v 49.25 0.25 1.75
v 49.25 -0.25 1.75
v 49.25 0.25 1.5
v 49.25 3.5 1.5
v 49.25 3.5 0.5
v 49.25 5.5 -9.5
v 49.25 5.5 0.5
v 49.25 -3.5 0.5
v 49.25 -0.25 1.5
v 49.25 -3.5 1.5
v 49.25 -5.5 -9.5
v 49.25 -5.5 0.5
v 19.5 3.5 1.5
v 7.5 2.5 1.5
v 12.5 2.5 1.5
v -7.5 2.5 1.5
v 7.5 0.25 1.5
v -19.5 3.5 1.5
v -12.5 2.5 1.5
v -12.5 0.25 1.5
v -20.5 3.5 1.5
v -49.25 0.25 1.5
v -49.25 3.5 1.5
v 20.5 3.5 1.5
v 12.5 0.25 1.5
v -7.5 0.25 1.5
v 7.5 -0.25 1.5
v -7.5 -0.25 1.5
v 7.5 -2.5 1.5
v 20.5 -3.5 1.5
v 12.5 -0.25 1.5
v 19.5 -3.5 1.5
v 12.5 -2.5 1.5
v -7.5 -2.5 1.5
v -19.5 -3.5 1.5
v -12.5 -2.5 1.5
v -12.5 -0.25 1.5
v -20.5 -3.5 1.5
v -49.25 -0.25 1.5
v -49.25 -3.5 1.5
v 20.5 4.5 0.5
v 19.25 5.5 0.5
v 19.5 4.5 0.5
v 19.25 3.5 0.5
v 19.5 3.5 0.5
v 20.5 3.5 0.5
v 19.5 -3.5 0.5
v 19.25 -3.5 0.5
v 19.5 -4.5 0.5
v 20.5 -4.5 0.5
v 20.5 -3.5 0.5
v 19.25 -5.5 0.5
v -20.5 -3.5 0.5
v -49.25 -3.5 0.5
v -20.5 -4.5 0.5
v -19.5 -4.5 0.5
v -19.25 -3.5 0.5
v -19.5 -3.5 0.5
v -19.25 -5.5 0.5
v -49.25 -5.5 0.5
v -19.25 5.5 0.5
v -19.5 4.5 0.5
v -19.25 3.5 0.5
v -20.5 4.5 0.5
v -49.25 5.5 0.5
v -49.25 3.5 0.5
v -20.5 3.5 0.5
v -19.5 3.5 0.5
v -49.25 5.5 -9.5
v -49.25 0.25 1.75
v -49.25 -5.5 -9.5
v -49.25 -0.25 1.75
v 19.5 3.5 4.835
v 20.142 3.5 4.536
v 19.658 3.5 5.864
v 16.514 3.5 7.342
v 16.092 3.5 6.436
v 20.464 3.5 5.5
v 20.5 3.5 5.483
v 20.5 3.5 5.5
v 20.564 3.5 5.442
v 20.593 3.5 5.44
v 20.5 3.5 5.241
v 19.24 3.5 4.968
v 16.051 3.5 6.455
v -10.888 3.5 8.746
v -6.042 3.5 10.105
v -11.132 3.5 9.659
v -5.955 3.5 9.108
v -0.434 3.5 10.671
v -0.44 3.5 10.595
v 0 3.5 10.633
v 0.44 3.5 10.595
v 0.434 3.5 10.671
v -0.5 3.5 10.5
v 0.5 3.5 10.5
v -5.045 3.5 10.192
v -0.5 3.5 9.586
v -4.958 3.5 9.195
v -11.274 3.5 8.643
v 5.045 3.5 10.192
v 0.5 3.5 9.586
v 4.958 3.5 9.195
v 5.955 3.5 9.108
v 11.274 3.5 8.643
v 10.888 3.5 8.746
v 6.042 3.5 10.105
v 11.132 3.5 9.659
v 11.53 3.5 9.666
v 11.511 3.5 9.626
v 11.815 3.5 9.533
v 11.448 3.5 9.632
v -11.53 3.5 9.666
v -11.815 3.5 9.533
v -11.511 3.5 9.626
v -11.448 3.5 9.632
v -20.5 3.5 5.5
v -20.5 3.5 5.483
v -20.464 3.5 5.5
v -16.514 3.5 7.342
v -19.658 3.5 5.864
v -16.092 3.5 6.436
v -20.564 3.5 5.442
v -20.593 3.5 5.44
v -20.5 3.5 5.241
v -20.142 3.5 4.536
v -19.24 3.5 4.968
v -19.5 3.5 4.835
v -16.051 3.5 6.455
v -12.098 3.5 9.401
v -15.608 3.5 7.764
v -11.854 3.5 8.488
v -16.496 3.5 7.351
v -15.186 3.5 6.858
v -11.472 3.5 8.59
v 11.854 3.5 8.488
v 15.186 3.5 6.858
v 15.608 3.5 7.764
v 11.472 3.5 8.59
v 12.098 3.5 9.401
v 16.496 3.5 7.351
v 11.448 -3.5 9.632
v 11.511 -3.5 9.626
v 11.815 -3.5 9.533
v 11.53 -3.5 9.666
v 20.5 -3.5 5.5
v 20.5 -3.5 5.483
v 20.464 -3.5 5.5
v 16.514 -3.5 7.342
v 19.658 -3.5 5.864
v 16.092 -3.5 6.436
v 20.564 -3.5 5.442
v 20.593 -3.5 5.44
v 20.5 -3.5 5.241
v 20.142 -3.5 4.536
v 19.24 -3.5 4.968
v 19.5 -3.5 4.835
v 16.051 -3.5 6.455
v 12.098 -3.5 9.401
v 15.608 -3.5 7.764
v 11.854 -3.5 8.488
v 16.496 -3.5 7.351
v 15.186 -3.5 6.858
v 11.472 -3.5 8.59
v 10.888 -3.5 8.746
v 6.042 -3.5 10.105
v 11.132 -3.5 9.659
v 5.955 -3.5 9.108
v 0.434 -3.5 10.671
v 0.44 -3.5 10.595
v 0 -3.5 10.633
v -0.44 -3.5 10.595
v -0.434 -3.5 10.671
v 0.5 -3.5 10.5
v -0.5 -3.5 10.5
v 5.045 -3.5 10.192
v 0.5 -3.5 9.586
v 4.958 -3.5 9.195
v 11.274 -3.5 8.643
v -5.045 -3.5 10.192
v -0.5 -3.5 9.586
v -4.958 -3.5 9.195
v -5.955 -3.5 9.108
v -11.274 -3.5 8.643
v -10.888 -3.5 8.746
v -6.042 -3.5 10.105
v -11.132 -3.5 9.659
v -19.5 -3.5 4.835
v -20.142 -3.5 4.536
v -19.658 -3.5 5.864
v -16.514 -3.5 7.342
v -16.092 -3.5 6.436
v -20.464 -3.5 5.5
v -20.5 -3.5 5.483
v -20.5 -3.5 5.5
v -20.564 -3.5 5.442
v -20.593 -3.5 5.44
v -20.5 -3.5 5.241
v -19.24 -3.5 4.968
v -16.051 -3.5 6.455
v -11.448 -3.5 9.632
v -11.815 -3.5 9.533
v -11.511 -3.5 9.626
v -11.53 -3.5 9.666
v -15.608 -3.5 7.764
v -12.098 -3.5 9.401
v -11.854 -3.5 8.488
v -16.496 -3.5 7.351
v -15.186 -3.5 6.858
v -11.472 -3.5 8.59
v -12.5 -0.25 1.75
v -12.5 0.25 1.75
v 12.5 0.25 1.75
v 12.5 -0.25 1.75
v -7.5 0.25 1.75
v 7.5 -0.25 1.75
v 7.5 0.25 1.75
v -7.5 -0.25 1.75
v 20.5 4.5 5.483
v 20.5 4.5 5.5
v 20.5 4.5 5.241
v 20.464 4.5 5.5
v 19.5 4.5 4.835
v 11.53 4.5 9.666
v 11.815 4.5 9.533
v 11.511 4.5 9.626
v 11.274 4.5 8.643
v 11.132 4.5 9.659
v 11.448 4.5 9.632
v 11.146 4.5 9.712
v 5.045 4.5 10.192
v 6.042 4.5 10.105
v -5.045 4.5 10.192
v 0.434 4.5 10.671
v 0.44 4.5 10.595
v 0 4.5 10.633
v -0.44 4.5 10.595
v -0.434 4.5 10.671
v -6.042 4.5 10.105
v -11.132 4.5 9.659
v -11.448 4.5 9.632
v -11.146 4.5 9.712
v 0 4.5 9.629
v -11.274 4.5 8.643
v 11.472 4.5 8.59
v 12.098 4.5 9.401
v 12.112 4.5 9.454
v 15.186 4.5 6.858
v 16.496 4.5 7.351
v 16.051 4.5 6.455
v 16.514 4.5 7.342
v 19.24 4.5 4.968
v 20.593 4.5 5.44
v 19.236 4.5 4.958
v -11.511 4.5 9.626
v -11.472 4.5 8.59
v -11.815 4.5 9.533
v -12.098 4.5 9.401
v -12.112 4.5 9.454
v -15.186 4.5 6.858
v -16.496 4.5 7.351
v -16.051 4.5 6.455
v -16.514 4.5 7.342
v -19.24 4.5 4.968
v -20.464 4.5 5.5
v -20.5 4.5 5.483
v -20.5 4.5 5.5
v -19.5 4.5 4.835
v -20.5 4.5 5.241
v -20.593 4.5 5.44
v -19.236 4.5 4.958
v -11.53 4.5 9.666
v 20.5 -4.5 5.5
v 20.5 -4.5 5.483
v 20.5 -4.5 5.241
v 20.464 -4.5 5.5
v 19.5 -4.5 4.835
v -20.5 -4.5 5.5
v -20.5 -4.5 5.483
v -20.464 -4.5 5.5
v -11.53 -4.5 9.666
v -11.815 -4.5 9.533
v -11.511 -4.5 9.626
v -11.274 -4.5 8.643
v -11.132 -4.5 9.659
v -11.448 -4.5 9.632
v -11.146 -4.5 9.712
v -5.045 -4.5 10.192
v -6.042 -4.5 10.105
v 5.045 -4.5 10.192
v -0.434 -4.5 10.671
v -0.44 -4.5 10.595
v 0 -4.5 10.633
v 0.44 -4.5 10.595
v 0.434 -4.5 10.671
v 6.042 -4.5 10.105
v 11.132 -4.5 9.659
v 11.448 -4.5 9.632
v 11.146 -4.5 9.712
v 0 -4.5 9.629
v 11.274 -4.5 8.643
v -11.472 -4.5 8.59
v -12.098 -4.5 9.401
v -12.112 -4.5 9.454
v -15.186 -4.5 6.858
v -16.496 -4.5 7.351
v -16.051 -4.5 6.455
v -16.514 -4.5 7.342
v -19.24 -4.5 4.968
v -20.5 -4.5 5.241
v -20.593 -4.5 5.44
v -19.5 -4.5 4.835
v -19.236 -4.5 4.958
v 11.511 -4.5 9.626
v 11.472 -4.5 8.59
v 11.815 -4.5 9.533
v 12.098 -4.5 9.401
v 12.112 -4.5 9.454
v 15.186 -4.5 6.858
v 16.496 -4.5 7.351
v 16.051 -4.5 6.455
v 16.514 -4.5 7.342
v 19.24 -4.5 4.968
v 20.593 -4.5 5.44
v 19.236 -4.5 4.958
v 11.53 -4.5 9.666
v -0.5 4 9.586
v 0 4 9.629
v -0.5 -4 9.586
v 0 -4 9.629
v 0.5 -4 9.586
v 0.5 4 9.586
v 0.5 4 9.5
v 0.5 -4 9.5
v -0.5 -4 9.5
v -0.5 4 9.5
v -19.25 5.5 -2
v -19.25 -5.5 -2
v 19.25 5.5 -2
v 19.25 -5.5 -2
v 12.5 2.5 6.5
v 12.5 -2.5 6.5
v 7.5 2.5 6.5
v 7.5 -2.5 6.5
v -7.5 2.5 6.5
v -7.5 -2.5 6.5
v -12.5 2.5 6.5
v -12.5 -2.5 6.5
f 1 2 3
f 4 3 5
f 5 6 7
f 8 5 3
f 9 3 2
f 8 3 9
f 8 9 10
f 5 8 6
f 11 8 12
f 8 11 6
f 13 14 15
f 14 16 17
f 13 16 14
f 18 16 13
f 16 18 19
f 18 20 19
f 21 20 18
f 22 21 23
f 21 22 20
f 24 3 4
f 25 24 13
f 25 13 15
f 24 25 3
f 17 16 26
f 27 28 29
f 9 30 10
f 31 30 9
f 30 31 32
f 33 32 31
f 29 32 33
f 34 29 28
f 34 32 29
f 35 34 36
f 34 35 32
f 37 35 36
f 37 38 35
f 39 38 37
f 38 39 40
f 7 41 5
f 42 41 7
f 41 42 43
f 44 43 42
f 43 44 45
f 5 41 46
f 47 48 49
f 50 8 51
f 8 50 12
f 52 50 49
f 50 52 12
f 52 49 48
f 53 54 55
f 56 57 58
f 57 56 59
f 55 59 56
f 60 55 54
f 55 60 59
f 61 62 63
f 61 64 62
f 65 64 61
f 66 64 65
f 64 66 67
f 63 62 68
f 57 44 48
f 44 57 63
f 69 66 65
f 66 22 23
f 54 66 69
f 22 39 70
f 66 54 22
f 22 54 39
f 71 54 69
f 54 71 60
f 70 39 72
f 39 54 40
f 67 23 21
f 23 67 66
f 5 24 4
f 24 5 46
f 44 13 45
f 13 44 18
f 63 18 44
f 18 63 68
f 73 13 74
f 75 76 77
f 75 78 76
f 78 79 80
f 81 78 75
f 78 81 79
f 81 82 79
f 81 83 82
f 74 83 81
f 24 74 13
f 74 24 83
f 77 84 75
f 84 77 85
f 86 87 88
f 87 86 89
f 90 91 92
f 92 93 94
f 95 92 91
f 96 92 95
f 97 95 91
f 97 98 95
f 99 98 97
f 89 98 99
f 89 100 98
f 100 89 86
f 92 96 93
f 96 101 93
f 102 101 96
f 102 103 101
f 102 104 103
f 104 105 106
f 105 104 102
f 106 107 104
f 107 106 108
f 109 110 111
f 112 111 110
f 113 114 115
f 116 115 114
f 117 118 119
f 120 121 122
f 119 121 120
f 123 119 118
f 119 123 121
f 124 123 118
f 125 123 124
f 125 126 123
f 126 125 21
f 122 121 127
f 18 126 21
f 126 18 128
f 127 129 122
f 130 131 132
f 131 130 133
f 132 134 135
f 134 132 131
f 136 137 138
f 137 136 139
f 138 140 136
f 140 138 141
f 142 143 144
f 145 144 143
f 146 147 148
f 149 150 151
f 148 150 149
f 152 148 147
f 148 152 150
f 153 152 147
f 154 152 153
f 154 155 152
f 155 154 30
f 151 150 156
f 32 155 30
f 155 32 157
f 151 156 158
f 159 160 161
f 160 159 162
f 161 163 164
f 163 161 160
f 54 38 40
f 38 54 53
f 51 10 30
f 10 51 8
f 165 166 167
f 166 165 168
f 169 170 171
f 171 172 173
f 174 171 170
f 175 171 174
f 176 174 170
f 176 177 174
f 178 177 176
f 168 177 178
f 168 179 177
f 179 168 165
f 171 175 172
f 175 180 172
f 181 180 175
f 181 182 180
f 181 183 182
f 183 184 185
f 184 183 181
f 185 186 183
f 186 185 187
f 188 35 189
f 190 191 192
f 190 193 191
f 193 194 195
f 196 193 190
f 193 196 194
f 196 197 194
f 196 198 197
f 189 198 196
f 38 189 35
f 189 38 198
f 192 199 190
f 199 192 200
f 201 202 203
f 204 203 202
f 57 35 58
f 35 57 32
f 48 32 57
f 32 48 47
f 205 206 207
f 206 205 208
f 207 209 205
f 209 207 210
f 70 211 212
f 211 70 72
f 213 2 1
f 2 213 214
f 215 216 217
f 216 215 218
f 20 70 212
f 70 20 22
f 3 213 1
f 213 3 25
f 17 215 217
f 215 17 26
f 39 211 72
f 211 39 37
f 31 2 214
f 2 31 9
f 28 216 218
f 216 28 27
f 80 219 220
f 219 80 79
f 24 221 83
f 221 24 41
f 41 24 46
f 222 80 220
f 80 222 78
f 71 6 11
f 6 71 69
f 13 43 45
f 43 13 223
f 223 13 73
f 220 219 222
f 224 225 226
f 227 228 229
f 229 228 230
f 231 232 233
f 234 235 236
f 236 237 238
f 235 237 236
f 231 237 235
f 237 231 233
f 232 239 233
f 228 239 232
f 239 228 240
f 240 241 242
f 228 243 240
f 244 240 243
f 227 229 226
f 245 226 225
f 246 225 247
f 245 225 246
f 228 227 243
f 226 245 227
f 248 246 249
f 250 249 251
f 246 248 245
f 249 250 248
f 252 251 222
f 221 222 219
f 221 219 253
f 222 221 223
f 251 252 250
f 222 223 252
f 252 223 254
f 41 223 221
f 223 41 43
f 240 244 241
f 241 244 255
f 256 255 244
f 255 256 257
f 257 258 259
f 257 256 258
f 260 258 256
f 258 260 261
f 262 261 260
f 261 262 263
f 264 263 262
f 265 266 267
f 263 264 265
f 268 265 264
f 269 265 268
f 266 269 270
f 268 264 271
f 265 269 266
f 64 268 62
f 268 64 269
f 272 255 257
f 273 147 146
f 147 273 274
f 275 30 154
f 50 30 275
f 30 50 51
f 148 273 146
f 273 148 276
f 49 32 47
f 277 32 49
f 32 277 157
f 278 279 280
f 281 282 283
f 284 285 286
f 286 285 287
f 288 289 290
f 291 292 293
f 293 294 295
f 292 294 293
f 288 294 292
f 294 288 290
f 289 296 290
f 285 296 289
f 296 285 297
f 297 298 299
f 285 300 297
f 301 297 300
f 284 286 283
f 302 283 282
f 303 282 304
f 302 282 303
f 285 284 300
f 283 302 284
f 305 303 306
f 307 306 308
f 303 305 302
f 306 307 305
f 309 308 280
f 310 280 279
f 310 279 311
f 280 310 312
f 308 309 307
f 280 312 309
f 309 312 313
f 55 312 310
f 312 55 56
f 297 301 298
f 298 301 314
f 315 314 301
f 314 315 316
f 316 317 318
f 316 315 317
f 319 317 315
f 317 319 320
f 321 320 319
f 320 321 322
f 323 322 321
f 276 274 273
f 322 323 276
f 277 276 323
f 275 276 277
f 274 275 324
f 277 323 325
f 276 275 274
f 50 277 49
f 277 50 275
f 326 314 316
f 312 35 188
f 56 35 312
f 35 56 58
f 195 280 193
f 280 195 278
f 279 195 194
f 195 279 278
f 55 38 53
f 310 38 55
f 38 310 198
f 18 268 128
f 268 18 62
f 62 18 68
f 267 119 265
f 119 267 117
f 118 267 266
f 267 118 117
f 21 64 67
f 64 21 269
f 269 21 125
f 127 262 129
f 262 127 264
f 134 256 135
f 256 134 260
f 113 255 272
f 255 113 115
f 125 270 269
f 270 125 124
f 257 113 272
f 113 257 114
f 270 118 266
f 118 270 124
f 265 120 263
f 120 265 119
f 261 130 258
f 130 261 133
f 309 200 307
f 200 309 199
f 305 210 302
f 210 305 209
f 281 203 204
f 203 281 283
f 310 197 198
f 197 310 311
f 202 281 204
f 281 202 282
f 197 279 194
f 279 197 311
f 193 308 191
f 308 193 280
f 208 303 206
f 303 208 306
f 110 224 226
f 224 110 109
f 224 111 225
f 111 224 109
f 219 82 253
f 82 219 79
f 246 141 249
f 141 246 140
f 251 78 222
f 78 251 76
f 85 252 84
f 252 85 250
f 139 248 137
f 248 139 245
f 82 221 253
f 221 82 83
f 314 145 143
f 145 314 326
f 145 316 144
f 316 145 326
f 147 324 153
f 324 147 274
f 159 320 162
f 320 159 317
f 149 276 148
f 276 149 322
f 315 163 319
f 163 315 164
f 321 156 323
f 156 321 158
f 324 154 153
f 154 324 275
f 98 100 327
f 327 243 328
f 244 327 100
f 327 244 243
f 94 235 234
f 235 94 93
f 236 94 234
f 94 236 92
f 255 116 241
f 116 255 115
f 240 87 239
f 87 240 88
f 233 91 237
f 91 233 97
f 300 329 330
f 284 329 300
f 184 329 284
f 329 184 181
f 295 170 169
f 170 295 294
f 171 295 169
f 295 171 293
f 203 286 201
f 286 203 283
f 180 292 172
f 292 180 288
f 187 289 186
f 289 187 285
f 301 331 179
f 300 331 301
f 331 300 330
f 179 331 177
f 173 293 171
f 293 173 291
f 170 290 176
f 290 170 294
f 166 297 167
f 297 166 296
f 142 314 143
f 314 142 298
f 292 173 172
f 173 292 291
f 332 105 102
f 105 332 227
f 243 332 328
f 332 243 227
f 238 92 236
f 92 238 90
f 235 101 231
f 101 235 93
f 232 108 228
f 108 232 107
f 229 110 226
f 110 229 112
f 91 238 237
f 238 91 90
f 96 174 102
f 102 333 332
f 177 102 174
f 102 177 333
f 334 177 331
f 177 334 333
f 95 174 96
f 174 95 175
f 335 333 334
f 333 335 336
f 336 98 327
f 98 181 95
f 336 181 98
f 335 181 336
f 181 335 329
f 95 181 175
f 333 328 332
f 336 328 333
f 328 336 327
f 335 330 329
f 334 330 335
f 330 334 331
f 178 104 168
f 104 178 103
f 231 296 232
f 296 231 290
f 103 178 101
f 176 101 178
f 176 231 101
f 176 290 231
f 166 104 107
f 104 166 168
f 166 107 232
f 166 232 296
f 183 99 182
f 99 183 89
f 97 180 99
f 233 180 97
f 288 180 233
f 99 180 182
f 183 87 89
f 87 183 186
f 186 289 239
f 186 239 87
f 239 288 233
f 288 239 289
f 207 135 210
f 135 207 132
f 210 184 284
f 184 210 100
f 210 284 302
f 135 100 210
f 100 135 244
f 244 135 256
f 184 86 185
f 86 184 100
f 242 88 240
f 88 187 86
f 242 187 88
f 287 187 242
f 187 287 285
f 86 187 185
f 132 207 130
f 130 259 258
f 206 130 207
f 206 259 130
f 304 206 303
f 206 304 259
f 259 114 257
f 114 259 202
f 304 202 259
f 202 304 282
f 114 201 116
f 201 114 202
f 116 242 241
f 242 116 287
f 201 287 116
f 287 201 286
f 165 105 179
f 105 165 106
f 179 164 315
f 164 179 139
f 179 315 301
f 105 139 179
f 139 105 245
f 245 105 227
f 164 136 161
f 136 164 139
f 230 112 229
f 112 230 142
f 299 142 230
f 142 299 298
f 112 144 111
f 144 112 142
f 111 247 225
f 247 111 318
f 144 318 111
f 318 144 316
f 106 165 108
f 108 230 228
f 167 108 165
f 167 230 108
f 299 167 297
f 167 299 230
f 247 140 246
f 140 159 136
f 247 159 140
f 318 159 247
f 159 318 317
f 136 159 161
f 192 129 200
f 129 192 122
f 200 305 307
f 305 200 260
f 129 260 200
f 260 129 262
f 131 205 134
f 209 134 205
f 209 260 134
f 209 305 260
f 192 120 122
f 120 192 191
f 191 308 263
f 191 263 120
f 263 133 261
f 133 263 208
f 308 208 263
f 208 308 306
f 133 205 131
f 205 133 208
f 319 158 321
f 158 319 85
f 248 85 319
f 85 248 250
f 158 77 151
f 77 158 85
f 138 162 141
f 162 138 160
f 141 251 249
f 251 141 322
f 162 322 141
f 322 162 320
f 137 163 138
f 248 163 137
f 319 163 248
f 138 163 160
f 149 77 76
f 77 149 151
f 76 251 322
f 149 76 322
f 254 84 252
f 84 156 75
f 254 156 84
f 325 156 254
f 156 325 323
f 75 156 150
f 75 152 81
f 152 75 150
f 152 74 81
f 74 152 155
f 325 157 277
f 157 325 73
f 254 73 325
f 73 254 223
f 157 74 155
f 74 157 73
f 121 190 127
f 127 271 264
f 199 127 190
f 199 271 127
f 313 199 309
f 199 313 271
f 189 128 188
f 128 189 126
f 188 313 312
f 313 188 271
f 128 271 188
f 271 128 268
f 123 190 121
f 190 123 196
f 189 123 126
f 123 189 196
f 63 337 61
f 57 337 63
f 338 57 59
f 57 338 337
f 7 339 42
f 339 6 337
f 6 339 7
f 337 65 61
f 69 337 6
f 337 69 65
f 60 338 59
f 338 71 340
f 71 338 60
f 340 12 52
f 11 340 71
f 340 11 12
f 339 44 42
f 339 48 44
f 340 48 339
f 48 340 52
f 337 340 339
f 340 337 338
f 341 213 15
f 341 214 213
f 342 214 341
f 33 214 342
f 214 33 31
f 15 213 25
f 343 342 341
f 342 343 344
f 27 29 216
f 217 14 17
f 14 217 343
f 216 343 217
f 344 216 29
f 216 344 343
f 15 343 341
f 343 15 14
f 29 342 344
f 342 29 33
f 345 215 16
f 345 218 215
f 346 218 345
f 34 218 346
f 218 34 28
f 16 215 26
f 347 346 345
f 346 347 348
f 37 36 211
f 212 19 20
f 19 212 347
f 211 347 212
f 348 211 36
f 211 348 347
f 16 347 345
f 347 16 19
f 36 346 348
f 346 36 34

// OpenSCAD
//It's a Bridge!
//Elias Jones 1/20/21

//Road
translate([0,0,1]) 
color("grey")
   cube([98.5,7,1],center=true);
translate([0,0,1.5]) 
color("white")
    cube([98.5,.5,.5],center=true); 
//Supports 
translate([20,4,-2]) 
color("red")
   cube([1,1,15],center=true);
translate([20,-4,-2]) 
color("red")
   cube([1,1,15],center=true);
translate([-20,-4,-2]) 
color("red")
   cube([1,1,15],center=true);
translate([-20,4,-2]) 
color("red")
   cube([1,1,15],center=true);
translate([-15.85,4,7.1]) 
rotate([0,65,0])
color("red")
    cube([1,1,10],center=true);  
translate([-15.85,-4,7.1]) 
rotate([0,65,0])
color("red")
    cube([1,1,10],center=true);     
translate([15.85,4,7.1]) 
rotate([0,-65,0])
color("red")
    cube([1,1,10],center=true);     
translate([15.85,-4,7.1]) 
rotate([0,-65,0])
color("red")
    cube([1,1,10],center=true);     
translate([-5.5,4,9.65]) 
rotate([0,85,0])
color("red")
    cube([1,1,12.],center=true);        
translate([-5.5,-4,9.65]) 
rotate([0,85,0])
color("red")
    cube([1,1,12.],center=true);      
translate([5.5,-4,9.65]) 
rotate([0,-85,0])
color("red")
    cube([1,1,12.],center=true);      
translate([5.5,4,9.65]) 
rotate([0,-85,0])
color("red")
    cube([1,1,12.],center=true); 
            translate([0,0,10]) 
rotate([0,0,0])
color("red")
    cube([1,8,1],center=true);       
translate([5.5,0,9.65]) 
rotate([0,-85,0])
color("red")
    cube([1,9,1],center=true);     
translate([-5.5,0,9.65]) 
rotate([0,85,0])
color("red")
    cube([1,9,1],center=true);
translate([-11.5,0,9.1]) 
rotate([0,75,0])
color("red")
    cube([1,9,1],center=true);
translate([11.5,0,9.1]) 
rotate([0,-75,0])
color("red")
    cube([1,9,1],center=true);      
translate([-15.85,0,7.1]) 
rotate([0,65,0])
color("red")
    cube([1,9,1],center=true);
translate([15.85,0,7.1]) 
rotate([0,-65,0])
color("red")
    cube([1,9,1],center=true);     
translate([19.9,0,5.2]) 
rotate([0,-65,0])
color("red")
   cube([1,9,1],center=true);   
translate([-19.9,0,5.2]) 
rotate([0,65,0])
color("red")
   cube([1,9,1],center=true);     
//Water and Grass   
translate([-34.25,0,-4.5])
color("#008F0F")
    cube([30,11,10],center=true); 
translate([34.25,0,-4.5])
color("#008F0F")
    cube([30,11,10],center=true); 
translate([0,0,-5.75]) 
color("#0080FF")
    cube([39,11,7.5],center=true); 
//Code for Weights   
translate([10,0,4])
color("black")
    cube(5,center=true);
translate([8.25,-2,3.5])
rotate([90,0,0 ])
color("white")
     text("75 lbs",size=1);  
translate([-10,0,4])
color("black")
    cube(5,center=true);
translate([-11.75,-2,3.5])
rotate([90,0,0 ])
color("white")
     text("75 lbs",size=1);  
